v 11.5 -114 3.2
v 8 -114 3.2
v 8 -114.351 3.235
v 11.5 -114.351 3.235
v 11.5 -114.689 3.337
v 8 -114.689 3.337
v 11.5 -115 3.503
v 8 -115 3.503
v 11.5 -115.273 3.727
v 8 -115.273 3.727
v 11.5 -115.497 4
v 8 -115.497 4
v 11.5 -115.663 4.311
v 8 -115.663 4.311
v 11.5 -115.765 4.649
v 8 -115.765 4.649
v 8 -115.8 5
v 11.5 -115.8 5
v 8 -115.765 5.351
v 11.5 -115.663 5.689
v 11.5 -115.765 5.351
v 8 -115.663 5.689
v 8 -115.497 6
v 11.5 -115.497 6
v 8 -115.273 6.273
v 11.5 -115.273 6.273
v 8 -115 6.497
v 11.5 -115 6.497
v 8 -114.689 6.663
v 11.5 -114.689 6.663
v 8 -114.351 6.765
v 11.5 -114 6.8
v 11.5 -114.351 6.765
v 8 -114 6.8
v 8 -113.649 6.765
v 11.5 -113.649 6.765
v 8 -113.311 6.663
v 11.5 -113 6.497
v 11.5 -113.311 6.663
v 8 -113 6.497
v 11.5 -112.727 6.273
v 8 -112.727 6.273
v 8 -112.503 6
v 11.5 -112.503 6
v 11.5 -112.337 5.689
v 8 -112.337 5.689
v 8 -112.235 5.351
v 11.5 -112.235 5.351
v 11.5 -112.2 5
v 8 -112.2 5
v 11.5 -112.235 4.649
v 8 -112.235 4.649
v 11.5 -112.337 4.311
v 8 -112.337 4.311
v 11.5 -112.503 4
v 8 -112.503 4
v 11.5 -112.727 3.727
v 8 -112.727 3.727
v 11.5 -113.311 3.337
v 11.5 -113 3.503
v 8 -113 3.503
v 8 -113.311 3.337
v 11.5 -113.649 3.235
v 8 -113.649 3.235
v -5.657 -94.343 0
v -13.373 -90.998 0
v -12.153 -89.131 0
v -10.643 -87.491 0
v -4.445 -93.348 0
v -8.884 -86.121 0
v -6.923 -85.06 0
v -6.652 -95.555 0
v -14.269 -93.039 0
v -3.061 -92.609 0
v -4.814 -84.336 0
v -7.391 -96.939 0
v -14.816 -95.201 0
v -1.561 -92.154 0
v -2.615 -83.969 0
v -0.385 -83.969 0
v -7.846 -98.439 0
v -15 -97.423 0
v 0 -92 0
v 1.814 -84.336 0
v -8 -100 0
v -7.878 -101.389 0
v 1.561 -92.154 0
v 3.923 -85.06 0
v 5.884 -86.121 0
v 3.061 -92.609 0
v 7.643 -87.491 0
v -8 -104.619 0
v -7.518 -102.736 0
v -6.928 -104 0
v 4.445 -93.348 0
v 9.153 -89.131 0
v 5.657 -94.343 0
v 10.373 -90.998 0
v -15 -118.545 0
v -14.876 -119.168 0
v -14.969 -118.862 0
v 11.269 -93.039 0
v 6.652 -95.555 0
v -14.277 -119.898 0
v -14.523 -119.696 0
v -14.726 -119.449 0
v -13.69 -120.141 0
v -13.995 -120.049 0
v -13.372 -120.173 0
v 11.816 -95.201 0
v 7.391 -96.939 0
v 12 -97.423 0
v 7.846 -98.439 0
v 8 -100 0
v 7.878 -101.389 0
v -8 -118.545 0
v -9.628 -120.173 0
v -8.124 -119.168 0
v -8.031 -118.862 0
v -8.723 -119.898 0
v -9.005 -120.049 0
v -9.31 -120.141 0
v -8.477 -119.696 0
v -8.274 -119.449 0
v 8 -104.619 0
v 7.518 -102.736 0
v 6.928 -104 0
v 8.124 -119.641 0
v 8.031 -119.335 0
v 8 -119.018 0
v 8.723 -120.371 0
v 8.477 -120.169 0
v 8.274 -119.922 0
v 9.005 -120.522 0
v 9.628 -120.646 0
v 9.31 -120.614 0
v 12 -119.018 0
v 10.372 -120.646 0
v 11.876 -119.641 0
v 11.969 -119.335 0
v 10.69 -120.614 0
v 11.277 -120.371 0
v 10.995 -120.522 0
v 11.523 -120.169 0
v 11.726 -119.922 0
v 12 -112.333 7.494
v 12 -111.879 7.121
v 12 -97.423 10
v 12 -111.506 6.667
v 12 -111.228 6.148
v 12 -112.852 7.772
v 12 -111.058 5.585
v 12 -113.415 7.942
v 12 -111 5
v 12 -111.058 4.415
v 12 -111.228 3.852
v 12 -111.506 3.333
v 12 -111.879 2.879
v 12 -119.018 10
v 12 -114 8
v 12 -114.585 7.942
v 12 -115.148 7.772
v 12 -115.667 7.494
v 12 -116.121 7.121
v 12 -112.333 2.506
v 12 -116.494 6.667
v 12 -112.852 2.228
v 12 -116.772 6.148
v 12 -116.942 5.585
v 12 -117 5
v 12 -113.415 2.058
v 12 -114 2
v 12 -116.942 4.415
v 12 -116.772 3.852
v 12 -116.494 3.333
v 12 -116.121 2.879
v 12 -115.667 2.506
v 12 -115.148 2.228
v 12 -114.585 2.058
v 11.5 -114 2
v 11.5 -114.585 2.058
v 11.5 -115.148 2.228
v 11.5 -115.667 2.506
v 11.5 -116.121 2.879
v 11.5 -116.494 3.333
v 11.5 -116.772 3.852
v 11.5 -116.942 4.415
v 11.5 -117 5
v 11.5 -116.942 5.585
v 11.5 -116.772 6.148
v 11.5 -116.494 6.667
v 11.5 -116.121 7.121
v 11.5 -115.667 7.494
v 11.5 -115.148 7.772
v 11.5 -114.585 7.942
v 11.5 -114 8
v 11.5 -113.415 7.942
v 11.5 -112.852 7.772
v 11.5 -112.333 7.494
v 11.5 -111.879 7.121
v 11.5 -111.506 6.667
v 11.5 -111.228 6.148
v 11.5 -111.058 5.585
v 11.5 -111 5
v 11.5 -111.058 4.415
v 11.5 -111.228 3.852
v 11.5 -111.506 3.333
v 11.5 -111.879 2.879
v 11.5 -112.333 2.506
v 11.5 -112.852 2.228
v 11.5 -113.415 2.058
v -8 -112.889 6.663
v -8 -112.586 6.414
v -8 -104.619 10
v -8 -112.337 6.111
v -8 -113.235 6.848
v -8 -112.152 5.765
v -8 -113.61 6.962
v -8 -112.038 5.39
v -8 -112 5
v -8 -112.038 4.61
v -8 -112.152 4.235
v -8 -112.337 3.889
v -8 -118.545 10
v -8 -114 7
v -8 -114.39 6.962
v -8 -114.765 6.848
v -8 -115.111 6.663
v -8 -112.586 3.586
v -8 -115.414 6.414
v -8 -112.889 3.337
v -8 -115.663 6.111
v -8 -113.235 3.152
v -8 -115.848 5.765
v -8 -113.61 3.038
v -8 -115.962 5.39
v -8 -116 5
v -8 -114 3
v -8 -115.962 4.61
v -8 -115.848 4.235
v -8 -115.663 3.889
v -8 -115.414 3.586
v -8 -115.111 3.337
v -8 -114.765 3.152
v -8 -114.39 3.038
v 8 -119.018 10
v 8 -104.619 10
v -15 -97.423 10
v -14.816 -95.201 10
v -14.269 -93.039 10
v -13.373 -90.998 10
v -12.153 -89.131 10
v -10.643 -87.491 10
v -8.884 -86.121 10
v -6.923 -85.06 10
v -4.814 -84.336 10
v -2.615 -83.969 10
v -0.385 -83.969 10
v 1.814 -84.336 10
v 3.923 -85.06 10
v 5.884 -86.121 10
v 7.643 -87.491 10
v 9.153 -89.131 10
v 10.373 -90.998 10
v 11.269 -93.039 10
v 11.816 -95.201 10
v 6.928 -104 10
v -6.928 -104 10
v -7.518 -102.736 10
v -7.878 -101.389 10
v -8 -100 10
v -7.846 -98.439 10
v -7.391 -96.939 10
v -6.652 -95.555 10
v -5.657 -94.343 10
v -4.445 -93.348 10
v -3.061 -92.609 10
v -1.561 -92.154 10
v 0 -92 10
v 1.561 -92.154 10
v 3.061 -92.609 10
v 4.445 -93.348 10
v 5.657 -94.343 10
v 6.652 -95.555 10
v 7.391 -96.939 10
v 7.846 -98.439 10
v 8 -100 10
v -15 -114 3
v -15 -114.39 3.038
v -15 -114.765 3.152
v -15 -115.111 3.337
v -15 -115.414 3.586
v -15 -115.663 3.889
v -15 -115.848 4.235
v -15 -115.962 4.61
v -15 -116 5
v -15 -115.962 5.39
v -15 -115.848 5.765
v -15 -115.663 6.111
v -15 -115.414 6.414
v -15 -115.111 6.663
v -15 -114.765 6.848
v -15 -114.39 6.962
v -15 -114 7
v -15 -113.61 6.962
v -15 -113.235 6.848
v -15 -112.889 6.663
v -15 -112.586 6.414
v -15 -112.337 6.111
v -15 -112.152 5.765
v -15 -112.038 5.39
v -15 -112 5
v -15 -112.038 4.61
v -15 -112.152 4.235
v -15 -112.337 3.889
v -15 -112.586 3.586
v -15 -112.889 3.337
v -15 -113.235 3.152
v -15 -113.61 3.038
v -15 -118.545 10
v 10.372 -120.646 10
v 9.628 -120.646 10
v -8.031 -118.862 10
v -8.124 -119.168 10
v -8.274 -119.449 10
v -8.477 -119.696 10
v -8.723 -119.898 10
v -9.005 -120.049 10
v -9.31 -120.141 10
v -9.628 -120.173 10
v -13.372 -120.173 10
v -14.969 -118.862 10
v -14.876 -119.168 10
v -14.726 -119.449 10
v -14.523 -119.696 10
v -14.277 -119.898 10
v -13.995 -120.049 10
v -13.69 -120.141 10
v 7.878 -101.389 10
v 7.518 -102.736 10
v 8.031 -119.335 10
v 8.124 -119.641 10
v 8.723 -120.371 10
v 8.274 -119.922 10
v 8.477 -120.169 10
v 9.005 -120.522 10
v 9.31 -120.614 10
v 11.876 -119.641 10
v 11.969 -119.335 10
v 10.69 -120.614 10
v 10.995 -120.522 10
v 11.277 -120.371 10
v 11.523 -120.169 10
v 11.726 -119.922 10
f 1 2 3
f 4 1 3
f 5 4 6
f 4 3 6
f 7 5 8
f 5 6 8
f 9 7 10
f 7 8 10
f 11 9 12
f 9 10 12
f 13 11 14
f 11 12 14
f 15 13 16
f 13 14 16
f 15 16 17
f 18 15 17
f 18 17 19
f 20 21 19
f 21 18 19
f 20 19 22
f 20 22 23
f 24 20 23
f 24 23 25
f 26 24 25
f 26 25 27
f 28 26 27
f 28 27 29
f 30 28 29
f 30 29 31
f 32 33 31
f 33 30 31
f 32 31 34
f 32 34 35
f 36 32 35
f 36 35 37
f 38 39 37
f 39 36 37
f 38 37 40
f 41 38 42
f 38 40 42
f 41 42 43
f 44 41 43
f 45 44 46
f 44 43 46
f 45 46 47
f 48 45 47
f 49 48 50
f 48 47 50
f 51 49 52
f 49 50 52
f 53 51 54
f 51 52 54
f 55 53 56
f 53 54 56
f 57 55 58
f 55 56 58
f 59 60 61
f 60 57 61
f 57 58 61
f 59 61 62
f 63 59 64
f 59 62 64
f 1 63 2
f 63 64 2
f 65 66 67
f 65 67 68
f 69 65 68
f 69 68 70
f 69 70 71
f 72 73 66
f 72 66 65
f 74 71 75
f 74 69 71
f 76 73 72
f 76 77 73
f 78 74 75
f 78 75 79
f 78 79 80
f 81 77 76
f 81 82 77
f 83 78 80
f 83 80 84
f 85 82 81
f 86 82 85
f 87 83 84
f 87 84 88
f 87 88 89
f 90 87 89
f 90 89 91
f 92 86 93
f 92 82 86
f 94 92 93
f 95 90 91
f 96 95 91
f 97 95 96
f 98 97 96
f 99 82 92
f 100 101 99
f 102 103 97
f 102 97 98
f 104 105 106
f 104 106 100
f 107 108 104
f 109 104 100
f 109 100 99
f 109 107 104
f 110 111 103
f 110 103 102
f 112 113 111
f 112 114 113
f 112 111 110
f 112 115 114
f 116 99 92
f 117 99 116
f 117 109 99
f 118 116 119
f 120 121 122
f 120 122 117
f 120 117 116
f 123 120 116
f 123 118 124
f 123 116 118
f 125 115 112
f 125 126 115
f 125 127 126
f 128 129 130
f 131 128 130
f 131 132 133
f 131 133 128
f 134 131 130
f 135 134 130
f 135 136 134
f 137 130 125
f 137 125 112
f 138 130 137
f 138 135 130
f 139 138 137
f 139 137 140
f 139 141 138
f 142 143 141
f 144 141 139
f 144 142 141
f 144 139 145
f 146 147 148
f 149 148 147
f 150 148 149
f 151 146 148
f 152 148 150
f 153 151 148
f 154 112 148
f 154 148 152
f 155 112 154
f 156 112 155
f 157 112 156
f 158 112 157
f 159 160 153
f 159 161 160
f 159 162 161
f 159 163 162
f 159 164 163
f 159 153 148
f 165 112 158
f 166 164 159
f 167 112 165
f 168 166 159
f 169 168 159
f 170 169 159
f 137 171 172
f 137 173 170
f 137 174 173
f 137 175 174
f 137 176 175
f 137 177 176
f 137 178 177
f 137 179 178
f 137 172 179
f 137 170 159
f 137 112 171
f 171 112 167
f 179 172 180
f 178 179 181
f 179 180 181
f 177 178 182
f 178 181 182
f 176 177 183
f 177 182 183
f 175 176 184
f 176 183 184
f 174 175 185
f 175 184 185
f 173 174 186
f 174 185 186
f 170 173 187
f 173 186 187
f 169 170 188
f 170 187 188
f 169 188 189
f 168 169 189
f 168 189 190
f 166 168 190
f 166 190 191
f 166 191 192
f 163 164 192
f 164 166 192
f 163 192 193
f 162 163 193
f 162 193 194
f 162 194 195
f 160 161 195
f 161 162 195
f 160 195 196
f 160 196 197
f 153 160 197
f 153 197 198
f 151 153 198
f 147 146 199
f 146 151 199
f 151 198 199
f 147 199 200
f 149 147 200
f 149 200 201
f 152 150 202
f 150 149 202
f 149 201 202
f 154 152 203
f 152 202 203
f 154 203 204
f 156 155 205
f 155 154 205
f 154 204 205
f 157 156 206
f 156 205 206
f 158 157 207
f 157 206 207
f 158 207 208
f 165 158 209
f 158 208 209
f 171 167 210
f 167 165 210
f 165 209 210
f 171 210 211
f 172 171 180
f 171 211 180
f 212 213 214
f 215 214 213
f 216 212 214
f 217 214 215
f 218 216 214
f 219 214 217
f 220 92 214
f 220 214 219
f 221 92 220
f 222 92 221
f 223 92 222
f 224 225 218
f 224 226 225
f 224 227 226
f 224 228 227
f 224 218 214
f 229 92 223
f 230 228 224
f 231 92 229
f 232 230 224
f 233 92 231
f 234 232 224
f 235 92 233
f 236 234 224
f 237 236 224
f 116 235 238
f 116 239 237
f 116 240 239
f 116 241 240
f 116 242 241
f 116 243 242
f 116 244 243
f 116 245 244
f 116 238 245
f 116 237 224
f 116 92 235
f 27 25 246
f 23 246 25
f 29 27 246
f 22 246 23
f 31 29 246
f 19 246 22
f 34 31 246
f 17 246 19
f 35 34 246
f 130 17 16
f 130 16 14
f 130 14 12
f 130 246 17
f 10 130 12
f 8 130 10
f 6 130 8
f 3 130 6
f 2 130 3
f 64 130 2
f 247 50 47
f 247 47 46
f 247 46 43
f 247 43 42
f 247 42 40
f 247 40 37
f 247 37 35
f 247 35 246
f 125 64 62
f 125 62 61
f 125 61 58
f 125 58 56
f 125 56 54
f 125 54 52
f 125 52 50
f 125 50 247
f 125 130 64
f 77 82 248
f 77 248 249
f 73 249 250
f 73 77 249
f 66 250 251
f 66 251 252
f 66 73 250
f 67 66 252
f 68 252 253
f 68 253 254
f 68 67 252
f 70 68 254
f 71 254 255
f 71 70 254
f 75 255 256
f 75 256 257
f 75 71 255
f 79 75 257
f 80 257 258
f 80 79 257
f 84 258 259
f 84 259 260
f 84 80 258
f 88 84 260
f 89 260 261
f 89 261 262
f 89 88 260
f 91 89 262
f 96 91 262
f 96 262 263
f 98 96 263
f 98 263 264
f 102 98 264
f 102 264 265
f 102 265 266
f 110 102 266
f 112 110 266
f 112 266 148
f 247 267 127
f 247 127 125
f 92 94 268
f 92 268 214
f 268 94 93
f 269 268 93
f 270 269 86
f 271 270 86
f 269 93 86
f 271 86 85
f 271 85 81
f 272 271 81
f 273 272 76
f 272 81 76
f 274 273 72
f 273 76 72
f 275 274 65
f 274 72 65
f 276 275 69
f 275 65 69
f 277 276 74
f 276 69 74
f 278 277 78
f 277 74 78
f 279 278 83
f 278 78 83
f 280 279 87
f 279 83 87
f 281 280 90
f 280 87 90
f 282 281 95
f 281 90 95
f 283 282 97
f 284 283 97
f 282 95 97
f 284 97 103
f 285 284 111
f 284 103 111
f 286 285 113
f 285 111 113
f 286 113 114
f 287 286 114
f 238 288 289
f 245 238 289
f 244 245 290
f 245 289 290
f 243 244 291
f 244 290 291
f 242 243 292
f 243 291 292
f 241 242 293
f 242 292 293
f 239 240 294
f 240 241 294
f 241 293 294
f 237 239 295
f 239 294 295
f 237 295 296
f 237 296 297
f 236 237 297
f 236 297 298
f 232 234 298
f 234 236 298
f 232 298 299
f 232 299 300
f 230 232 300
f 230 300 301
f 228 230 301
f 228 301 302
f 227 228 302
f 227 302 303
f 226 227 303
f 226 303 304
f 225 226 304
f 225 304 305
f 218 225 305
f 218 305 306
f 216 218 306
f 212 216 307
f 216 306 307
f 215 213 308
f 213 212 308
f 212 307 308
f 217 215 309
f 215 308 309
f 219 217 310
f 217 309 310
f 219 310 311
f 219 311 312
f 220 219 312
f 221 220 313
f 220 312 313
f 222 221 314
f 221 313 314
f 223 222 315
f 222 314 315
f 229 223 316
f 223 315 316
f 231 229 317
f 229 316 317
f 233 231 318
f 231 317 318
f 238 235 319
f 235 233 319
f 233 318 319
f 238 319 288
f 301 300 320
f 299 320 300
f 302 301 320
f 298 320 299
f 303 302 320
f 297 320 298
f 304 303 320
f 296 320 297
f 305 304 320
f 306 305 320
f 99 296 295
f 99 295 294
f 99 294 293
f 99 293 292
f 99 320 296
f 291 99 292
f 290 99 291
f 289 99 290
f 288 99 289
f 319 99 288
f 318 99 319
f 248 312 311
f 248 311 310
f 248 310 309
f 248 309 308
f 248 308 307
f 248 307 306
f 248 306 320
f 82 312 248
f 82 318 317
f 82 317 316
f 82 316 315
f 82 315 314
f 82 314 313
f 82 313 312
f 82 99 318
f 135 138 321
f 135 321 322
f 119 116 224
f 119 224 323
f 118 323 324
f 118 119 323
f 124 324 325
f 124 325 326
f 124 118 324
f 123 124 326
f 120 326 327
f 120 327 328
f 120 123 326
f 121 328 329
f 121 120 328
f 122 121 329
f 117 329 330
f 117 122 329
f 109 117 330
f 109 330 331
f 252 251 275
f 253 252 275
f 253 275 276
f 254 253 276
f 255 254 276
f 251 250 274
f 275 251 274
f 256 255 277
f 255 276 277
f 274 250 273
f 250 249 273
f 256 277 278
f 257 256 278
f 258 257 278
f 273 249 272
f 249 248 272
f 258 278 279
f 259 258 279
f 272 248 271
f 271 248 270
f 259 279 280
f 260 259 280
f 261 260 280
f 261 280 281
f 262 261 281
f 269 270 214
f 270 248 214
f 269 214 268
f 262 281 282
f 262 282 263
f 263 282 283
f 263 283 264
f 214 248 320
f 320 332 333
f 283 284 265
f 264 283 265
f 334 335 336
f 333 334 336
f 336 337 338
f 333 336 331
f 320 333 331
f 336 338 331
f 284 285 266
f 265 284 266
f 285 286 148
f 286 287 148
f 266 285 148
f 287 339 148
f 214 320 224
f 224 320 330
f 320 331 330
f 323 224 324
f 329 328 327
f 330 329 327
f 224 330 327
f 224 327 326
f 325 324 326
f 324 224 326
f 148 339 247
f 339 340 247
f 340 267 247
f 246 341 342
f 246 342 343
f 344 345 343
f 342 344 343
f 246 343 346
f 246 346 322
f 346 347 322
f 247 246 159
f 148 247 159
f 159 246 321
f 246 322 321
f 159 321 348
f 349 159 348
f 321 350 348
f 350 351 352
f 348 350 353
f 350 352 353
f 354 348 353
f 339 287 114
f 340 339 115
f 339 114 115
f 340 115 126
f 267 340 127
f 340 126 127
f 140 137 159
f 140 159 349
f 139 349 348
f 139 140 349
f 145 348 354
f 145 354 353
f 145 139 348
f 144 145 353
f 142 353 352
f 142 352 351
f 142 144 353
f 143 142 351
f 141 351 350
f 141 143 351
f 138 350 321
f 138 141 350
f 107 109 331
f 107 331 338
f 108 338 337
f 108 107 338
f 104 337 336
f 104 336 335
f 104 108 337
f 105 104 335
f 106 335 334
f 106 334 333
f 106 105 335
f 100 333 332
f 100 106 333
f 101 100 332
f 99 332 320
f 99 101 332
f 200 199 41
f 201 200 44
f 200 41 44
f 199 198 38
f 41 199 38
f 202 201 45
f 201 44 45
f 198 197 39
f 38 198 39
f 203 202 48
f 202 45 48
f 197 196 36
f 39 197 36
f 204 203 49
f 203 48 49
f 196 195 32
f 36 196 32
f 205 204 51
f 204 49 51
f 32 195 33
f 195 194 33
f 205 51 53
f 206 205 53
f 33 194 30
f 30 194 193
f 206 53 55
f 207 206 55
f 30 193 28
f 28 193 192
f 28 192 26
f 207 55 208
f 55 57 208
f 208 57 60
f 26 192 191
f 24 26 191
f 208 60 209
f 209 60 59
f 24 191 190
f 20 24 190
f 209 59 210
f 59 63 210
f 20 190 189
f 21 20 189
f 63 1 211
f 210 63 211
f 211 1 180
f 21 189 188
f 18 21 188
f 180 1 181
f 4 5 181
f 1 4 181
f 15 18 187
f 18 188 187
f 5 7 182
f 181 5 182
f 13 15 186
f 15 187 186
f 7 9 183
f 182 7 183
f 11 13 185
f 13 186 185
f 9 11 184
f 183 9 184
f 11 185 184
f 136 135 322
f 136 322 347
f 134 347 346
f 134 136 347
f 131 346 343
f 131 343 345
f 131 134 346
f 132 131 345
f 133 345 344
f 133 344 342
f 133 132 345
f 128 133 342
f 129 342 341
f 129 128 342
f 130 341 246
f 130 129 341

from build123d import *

# Parameters (mm, degrees)
CYLINDER011024_R               = 1.8
CYLINDER011024_DEPTH           = 20
CYLINDER011020_R               = 3
CYLINDER011020_DEPTH           = 20
CYLINDER011027_R               = 2
CYLINDER011027_DEPTH           = 20
CYLINDER011022_R               = 8
CYLINDER011022_DEPTH           = 10
CYLINDER011023_W               = 11
CYLINDER011023_H               = 10
CYLINDER011023_ANGLE           = 240
CYLINDER011023_PLACEMENT_ANGLE = 150
PAD001_DEPTH                   = 10


with BuildPart() as bolt_hole004:
    # Cylinder011024 → Cylinder011024 (new body)
    with BuildSketch(Plane(origin=(-1, 14, 5), x_dir=(0, 0, -1), z_dir=(1, 0, 0))):
        Circle(CYLINDER011024_R)
    extrude(amount=CYLINDER011024_DEPTH)


with BuildPart() as bolt_head_hole001:
    # Cylinder011020 → Cylinder011020 (new body)
    with BuildSketch(Plane(origin=(11.5, 14, 5), x_dir=(0, 0, -1), z_dir=(1, 0, 0))):
        Circle(CYLINDER011020_R)
    extrude(amount=CYLINDER011020_DEPTH)


with BuildPart() as shaft_attachment_holde_fusion001:
    # Cylinder011027 → Cylinder011027 (new body)
    with BuildSketch(Plane(origin=(-22, 14, 5), x_dir=(0, 0, -1), z_dir=(1, 0, 0))):
        Circle(CYLINDER011027_R)
    extrude(amount=CYLINDER011027_DEPTH)

    # Fusion009: union bolt hole004, bolt head hole001
    add(bolt_hole004.part)
    add(bolt_head_hole001.part)


with BuildPart() as cylinder011022:
    # Cylinder011022 → Cylinder011022 (new body)
    with BuildSketch(Plane.XY):
        Circle(CYLINDER011022_R)
    extrude(amount=CYLINDER011022_DEPTH)


with BuildPart() as cut023015009018:
    # Cylinder011023 → Cylinder011023 (revolve)
    with BuildSketch(Plane.XZ):
        with Locations((5.5, 5)):
            Rectangle(CYLINDER011023_W, CYLINDER011023_H)
    revolve(axis=Axis((0, 0, 0), (0, 0, 1)), revolution_arc=CYLINDER011023_ANGLE)


with BuildPart() as cut023015009018_1:
    # Cylinder011023 placement: moved
    add(cut023015009018.part.rotate(Axis((0, 0, 0), (0, 0, 1)), CYLINDER011023_PLACEMENT_ANGLE))

    # Cut023015009018: cut Cylinder011022
    add(cylinder011022.part, mode=Mode.SUBTRACT)


with BuildPart() as shaft_attachment_cut001:
    # Sketch004 → Pad001 (new body)
    with BuildSketch(Plane.XY):
        with BuildLine():
            Line((12, -2.57721), (12, 19.017869))
            ThreePointArc((12, 19.017869), (11.523224, 20.168908), (10.372186, 20.645684))
            Line((10.372186, 20.645684), (9.627814, 20.645684))
            ThreePointArc((9.627814, 20.645684), (8.476776, 20.168908), (8, 19.017869))
            Line((8, 19.017869), (8, 0))
            ThreePointArc((-8, 0), (0, -8), (8, 0))
            Line((-8, 0), (-8, 18.544726))
            ThreePointArc((-8, 18.544726), (-8.476776, 19.695765), (-9.627814, 20.17254))
            Line((-9.627814, 20.17254), (-13.372186, 20.17254))
            ThreePointArc((-13.372186, 20.17254), (-14.523224, 19.695765), (-15, 18.544726))
            Line((-15, 18.544726), (-15, -2.57721))
            ThreePointArc((-15, -2.57721), (-1.5, -16.07721), (12, -2.57721))
        make_face()
    extrude(amount=PAD001_DEPTH)

    # Fusion008: union Cut023015009018
    add(cut023015009018_1.part)

    # Cut023015009017: cut shaft attachment holde fusion001
    add(shaft_attachment_holde_fusion001.part, mode=Mode.SUBTRACT)


with BuildPart() as part_mirroring003:
    # Part__Mirroring003: instance of shaft attachment  cut001
    add(shaft_attachment_cut001.part.mirror(Plane(origin=(0, -50, 0), x_dir=(1, 0, 0), z_dir=(0, 1, 0))))


solid = part_mirroring003.part
